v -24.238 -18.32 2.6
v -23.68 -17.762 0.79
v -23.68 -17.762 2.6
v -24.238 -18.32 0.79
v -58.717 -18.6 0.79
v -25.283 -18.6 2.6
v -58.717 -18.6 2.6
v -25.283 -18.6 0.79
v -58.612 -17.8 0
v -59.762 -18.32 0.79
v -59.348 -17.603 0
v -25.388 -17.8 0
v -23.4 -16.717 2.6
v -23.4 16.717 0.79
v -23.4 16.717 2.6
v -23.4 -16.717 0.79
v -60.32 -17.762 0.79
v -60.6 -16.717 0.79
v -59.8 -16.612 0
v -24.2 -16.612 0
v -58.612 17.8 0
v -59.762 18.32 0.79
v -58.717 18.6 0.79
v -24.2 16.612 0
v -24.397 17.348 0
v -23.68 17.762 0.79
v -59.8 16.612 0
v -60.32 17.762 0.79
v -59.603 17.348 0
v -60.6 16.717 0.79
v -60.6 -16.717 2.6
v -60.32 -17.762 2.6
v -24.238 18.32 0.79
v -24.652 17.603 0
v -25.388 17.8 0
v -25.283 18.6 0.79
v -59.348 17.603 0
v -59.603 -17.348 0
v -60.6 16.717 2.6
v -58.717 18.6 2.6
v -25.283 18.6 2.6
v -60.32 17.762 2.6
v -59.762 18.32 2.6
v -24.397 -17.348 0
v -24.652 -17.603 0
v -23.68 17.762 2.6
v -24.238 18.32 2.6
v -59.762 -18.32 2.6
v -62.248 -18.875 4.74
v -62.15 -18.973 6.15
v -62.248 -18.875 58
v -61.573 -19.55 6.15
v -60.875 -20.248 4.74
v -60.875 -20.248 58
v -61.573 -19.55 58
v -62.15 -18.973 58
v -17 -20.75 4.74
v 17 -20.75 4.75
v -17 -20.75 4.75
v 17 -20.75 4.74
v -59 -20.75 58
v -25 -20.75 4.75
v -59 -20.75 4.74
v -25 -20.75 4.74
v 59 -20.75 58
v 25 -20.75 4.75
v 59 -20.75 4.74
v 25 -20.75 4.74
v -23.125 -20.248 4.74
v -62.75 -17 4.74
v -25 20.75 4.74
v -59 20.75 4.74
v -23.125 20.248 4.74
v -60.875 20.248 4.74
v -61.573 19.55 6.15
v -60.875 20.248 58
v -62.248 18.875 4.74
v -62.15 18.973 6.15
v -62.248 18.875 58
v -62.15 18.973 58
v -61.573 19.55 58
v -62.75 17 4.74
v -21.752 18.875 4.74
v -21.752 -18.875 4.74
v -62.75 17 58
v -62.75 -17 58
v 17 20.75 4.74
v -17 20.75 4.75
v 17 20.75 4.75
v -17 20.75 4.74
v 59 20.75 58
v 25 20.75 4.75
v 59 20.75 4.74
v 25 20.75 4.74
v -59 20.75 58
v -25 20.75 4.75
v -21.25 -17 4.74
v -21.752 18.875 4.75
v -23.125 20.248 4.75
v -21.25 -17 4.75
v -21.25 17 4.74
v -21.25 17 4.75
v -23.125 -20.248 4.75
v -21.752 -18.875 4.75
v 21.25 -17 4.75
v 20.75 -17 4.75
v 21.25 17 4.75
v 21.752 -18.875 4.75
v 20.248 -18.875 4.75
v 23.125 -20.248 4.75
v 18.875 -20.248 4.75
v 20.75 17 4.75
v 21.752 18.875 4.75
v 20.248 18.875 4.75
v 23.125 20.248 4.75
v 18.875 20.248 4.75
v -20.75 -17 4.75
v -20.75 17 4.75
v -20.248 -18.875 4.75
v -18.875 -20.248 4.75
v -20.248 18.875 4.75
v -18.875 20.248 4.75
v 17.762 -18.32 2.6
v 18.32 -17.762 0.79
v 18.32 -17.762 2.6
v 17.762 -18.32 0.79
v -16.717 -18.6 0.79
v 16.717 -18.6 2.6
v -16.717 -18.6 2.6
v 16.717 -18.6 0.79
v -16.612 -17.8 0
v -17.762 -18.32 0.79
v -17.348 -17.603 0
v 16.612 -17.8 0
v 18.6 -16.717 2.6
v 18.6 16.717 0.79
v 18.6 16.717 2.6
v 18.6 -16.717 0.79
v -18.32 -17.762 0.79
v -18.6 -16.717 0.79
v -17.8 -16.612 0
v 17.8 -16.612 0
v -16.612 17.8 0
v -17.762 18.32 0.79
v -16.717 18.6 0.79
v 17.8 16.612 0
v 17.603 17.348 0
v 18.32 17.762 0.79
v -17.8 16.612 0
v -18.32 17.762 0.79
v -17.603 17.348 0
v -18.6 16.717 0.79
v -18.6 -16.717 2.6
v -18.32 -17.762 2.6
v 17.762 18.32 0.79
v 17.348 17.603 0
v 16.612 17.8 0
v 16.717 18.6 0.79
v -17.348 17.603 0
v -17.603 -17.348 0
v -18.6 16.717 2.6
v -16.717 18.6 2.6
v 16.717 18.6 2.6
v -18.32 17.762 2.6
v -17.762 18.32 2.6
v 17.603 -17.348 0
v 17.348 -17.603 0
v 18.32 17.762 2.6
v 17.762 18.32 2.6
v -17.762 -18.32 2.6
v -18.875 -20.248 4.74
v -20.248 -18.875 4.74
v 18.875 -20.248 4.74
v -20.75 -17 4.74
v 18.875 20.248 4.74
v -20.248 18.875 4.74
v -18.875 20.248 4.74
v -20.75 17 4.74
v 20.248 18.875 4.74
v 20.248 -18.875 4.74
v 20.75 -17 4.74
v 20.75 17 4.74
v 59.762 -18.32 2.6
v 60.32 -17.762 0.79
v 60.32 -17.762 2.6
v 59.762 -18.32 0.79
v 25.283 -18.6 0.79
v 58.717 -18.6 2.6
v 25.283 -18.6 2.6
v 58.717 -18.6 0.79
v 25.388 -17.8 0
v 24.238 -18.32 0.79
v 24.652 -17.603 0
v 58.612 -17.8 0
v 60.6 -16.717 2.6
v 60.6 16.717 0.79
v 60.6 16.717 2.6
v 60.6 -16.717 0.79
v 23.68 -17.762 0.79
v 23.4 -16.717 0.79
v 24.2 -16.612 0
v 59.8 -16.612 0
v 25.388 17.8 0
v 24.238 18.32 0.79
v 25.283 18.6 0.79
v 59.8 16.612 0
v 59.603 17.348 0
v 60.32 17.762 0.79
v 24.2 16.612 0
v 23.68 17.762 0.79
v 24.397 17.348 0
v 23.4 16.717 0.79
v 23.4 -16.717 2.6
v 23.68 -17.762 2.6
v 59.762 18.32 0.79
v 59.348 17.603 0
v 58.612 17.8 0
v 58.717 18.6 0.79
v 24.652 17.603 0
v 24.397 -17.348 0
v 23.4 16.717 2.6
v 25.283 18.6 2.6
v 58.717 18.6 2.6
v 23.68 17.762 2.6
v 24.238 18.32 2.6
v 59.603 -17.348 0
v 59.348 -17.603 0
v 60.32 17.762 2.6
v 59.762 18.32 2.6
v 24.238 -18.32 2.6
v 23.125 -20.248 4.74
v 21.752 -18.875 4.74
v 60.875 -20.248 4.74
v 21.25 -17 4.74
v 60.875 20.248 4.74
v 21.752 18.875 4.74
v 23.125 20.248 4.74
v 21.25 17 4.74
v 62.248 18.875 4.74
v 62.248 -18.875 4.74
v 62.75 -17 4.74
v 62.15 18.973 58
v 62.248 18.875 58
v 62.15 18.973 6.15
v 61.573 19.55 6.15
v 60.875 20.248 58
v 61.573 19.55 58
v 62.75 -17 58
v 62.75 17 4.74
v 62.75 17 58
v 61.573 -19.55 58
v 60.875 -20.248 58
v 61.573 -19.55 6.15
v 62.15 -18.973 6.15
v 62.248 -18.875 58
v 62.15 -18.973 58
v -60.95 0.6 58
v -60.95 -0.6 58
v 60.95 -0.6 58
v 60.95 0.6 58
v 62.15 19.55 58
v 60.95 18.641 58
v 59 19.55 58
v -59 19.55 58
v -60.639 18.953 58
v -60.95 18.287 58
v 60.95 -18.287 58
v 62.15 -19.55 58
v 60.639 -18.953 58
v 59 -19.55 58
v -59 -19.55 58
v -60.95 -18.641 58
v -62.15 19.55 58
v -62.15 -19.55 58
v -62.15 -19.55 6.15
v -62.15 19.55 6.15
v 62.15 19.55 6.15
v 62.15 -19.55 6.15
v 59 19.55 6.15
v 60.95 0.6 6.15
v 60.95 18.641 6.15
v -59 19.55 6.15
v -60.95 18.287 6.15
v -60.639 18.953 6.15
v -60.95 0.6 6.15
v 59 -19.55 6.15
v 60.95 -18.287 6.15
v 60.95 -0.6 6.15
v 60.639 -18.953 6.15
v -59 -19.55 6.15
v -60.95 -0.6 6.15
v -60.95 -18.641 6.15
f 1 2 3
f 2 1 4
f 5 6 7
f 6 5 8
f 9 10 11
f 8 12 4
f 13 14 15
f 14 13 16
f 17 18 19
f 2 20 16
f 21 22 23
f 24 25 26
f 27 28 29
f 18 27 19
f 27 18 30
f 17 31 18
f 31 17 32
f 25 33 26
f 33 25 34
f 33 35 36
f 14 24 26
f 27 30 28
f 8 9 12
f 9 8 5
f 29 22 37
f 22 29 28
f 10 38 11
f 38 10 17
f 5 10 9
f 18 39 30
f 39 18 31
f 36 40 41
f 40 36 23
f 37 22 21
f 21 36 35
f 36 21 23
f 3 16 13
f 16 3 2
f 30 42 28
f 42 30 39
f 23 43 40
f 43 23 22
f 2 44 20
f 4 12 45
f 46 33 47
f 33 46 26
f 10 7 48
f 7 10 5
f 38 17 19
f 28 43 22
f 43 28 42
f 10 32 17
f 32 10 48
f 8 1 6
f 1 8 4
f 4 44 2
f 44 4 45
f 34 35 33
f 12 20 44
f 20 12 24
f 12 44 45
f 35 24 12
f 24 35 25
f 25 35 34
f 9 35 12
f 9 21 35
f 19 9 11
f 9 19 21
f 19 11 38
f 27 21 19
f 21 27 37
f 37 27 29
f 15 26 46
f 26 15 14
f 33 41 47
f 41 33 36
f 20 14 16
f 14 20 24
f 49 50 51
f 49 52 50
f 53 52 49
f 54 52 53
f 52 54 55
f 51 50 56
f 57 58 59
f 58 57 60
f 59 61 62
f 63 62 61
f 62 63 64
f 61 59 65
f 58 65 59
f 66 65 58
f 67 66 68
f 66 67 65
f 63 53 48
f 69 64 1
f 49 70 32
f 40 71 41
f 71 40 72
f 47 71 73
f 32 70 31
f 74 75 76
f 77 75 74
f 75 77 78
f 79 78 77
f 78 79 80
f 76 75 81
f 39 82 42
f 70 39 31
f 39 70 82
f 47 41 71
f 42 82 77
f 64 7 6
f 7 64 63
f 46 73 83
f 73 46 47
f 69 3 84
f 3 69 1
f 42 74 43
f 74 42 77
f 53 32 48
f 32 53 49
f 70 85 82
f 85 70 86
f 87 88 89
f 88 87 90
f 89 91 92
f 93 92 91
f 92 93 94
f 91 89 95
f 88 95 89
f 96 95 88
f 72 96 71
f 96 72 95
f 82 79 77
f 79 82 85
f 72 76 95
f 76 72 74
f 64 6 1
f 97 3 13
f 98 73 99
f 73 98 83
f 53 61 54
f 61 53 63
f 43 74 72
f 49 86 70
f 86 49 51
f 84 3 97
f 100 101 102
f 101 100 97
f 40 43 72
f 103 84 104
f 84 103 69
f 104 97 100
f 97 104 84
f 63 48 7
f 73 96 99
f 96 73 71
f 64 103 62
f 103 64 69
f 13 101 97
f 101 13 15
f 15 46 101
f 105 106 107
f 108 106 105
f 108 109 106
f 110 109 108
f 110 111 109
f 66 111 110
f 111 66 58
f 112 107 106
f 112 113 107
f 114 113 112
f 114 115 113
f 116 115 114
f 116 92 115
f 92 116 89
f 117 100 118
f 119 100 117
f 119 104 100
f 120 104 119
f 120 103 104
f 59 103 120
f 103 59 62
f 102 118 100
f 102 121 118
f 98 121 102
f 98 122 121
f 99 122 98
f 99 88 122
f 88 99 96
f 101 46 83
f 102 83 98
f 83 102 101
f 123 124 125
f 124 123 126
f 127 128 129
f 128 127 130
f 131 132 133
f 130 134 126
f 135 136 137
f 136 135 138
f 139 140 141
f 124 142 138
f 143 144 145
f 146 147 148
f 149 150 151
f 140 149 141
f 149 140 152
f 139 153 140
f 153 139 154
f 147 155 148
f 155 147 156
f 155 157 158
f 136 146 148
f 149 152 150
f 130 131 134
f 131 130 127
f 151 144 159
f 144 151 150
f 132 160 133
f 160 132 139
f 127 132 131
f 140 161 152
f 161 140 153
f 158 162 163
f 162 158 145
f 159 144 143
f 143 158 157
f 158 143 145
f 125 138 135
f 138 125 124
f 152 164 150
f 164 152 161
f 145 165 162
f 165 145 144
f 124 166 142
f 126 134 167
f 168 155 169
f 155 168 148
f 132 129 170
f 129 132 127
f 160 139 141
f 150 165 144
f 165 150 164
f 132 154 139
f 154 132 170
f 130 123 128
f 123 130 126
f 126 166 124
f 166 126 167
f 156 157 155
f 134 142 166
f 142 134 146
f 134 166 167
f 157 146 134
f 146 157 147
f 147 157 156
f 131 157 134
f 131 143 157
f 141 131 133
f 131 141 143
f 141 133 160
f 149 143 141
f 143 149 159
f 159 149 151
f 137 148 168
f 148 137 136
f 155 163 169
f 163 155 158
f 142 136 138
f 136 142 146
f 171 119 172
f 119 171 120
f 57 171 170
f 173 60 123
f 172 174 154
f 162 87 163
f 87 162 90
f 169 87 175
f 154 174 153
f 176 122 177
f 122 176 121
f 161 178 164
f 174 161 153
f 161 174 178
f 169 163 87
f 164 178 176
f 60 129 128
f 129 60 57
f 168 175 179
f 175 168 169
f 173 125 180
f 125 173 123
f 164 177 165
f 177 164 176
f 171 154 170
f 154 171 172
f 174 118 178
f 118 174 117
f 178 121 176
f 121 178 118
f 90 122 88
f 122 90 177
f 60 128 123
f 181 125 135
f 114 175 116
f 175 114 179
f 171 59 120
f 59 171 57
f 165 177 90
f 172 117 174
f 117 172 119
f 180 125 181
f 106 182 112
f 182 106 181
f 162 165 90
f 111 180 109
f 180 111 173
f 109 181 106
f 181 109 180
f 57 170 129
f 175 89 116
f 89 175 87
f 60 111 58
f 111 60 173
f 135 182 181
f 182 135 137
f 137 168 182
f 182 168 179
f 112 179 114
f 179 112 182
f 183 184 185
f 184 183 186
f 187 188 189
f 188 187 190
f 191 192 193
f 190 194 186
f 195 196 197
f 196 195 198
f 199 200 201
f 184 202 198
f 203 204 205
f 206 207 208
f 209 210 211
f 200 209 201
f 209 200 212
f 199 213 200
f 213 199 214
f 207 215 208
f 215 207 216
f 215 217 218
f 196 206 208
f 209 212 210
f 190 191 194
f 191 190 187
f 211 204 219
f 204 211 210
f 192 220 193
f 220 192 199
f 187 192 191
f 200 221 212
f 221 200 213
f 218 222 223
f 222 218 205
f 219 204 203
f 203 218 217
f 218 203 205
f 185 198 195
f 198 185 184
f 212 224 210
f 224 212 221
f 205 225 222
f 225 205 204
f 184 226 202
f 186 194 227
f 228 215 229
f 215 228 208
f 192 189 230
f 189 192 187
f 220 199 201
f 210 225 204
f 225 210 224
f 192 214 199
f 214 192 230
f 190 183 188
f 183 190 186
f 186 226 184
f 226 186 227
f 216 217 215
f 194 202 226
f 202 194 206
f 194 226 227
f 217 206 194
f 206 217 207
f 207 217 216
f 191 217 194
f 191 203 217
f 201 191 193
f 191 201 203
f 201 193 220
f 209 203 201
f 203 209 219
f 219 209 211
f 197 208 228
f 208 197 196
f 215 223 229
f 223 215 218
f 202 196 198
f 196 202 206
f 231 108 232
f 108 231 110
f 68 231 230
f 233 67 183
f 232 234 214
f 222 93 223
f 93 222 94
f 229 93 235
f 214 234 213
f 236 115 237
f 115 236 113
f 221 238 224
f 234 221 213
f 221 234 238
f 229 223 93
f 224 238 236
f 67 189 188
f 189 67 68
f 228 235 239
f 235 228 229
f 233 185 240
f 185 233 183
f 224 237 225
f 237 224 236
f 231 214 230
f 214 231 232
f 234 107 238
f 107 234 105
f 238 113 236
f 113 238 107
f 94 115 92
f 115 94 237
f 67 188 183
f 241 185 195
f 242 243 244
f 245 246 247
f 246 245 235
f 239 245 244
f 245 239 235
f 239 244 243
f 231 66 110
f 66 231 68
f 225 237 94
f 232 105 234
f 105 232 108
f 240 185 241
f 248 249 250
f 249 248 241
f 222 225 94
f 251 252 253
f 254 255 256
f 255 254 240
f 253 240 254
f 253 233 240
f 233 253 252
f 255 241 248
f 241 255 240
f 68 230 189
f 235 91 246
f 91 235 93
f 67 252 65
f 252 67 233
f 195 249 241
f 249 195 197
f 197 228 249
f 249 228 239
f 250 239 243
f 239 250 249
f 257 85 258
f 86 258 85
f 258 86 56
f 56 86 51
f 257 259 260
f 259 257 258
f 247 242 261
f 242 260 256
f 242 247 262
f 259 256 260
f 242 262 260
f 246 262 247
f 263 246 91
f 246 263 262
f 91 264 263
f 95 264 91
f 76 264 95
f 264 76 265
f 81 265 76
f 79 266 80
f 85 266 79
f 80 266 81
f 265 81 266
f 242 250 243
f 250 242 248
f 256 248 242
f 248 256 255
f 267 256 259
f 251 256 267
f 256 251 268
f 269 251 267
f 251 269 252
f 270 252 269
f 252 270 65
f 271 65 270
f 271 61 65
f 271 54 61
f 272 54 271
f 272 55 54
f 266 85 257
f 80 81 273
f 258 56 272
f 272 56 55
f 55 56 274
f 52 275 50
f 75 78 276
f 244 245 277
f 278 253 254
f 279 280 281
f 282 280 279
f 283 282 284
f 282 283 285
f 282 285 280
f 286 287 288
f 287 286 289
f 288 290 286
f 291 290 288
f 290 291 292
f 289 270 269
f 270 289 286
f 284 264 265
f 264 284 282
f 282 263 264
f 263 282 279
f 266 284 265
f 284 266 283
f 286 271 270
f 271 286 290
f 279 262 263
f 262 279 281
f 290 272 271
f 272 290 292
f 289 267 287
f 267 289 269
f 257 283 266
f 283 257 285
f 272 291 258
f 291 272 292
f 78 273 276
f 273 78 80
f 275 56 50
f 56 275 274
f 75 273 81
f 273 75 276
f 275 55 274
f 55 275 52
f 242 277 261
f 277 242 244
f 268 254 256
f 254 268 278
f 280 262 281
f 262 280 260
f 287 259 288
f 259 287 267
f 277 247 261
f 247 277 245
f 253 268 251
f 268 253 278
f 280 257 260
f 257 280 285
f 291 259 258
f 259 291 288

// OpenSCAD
// bin_adhesive_foam — 3×1 × 58, split down its length into two flat-bottomed
// bays: the adhesive/foam roll in one, the loose strips in the other. The same
// footprint and height as the cleanroom-wipes bin, so the two sit as a pair.
//
// THE ROLL SITS IN NOW. The 2×1 (v1.0.0) had the ⌀92 roll BRIDGING an 81.1 mm
// bay — resting across the two end rims, never touching the floor — and on the
// bench it did not stand up well: a thin disc balanced on two rim edges rocks.
// A 3×1 bay is 123.1 long, so the whole roll drops to the floor with 15 mm of
// run either side, and the 18.95 mm slot width is what keeps it upright, as
// before. 58 tall puts the rim ~40 mm below the roll's top, which is the grab.
//
// TWO COMPARTMENTS, NO SHAPING. A saddle at the roll's radius was tried in an
// earlier cut and left a thin disc free to lean; it is the slot width that
// holds it, and a flat floor does that as well as a curved one.
//
// WHAT THE EARLIER CUTS GOT WRONG, since the reasoning is worth keeping:
//   3×2   the trough spanned the bin's FULL DEPTH, handing 81 mm of it to a roll
//         about 9 mm thick. That is what made the part enormous.
//   2×1a  then ⌀92 was assumed to need CONTAINING, judged impossible, and the
//         trough shrunk to ⌀50 — which fits no roll at all.
//   2×1b  a full-depth saddle cradled it against rolling but left a thin disc
//         free to lean, and it did.
//   2×1c  (v1.0.0) flat bays, roll bridging the end rims — stood up, badly.
//
// The divider sits at the midline, so no unmeasured dimension is involved: half
// the bin each. Roll thickness and strip size never enter it.
//
// PRINT: as emitted, feet down. No supports.
//
// SPDX-License-Identifier: CC-BY-NC-4.0
// Copyright (c) 2026 Aaron Cupp
include <../lib/gridfinity.scad>

/* [Contents] */
// ✅ MEASURED — Kapton reel outer ⌀, 2026-08-20 (core 78.5, outer ≈92). The foam
// roll is the same DIAMETER. Nothing below is cut from it; the assert only
// proves the bay is long enough for the roll to reach the floor.
ROLL_D = 92.0;

/* [Bin] */
NX = 3; NY = 1;  // matches bin_cleanroom_wipes
H     = 58.0;    // [12:0.5:70] matches bin_cleanroom_wipes; roll top ~40 above the rim
WALL  = 1.2;
FLOOR = 1.4;
DIV   = 1.2;     // [1.2:0.1:3] wall between the two compartments

W = NX*GF - 0.5;  D = NY*GF - 0.5;
IW = W - 2*WALL;  ID = D - 2*WALL;
BAY = (ID - DIV)/2;

assert(H > BIN_BASE_H + FLOOR + 6, "Too shallow to hold anything.");
assert(IW > ROLL_D + 10, "Bay too short for the roll to sit on the floor with any run.");
echo(str("bin ", W, " x ", D, " x ", H, "; two bays ", IW, " x ", BAY,
         ", floor to rim ", H - BIN_BASE_H - FLOOR,
         "; the ⌀", ROLL_D, " roll sits on the floor with ", (IW - ROLL_D)/2, " mm of run each way, top ",
         BIN_BASE_H + FLOOR + ROLL_D - H, " above the rim"));

divided_bin(NX, NY, H, cols = 1, rows = 2, wall = WALL, floor = FLOOR, div = DIV);
